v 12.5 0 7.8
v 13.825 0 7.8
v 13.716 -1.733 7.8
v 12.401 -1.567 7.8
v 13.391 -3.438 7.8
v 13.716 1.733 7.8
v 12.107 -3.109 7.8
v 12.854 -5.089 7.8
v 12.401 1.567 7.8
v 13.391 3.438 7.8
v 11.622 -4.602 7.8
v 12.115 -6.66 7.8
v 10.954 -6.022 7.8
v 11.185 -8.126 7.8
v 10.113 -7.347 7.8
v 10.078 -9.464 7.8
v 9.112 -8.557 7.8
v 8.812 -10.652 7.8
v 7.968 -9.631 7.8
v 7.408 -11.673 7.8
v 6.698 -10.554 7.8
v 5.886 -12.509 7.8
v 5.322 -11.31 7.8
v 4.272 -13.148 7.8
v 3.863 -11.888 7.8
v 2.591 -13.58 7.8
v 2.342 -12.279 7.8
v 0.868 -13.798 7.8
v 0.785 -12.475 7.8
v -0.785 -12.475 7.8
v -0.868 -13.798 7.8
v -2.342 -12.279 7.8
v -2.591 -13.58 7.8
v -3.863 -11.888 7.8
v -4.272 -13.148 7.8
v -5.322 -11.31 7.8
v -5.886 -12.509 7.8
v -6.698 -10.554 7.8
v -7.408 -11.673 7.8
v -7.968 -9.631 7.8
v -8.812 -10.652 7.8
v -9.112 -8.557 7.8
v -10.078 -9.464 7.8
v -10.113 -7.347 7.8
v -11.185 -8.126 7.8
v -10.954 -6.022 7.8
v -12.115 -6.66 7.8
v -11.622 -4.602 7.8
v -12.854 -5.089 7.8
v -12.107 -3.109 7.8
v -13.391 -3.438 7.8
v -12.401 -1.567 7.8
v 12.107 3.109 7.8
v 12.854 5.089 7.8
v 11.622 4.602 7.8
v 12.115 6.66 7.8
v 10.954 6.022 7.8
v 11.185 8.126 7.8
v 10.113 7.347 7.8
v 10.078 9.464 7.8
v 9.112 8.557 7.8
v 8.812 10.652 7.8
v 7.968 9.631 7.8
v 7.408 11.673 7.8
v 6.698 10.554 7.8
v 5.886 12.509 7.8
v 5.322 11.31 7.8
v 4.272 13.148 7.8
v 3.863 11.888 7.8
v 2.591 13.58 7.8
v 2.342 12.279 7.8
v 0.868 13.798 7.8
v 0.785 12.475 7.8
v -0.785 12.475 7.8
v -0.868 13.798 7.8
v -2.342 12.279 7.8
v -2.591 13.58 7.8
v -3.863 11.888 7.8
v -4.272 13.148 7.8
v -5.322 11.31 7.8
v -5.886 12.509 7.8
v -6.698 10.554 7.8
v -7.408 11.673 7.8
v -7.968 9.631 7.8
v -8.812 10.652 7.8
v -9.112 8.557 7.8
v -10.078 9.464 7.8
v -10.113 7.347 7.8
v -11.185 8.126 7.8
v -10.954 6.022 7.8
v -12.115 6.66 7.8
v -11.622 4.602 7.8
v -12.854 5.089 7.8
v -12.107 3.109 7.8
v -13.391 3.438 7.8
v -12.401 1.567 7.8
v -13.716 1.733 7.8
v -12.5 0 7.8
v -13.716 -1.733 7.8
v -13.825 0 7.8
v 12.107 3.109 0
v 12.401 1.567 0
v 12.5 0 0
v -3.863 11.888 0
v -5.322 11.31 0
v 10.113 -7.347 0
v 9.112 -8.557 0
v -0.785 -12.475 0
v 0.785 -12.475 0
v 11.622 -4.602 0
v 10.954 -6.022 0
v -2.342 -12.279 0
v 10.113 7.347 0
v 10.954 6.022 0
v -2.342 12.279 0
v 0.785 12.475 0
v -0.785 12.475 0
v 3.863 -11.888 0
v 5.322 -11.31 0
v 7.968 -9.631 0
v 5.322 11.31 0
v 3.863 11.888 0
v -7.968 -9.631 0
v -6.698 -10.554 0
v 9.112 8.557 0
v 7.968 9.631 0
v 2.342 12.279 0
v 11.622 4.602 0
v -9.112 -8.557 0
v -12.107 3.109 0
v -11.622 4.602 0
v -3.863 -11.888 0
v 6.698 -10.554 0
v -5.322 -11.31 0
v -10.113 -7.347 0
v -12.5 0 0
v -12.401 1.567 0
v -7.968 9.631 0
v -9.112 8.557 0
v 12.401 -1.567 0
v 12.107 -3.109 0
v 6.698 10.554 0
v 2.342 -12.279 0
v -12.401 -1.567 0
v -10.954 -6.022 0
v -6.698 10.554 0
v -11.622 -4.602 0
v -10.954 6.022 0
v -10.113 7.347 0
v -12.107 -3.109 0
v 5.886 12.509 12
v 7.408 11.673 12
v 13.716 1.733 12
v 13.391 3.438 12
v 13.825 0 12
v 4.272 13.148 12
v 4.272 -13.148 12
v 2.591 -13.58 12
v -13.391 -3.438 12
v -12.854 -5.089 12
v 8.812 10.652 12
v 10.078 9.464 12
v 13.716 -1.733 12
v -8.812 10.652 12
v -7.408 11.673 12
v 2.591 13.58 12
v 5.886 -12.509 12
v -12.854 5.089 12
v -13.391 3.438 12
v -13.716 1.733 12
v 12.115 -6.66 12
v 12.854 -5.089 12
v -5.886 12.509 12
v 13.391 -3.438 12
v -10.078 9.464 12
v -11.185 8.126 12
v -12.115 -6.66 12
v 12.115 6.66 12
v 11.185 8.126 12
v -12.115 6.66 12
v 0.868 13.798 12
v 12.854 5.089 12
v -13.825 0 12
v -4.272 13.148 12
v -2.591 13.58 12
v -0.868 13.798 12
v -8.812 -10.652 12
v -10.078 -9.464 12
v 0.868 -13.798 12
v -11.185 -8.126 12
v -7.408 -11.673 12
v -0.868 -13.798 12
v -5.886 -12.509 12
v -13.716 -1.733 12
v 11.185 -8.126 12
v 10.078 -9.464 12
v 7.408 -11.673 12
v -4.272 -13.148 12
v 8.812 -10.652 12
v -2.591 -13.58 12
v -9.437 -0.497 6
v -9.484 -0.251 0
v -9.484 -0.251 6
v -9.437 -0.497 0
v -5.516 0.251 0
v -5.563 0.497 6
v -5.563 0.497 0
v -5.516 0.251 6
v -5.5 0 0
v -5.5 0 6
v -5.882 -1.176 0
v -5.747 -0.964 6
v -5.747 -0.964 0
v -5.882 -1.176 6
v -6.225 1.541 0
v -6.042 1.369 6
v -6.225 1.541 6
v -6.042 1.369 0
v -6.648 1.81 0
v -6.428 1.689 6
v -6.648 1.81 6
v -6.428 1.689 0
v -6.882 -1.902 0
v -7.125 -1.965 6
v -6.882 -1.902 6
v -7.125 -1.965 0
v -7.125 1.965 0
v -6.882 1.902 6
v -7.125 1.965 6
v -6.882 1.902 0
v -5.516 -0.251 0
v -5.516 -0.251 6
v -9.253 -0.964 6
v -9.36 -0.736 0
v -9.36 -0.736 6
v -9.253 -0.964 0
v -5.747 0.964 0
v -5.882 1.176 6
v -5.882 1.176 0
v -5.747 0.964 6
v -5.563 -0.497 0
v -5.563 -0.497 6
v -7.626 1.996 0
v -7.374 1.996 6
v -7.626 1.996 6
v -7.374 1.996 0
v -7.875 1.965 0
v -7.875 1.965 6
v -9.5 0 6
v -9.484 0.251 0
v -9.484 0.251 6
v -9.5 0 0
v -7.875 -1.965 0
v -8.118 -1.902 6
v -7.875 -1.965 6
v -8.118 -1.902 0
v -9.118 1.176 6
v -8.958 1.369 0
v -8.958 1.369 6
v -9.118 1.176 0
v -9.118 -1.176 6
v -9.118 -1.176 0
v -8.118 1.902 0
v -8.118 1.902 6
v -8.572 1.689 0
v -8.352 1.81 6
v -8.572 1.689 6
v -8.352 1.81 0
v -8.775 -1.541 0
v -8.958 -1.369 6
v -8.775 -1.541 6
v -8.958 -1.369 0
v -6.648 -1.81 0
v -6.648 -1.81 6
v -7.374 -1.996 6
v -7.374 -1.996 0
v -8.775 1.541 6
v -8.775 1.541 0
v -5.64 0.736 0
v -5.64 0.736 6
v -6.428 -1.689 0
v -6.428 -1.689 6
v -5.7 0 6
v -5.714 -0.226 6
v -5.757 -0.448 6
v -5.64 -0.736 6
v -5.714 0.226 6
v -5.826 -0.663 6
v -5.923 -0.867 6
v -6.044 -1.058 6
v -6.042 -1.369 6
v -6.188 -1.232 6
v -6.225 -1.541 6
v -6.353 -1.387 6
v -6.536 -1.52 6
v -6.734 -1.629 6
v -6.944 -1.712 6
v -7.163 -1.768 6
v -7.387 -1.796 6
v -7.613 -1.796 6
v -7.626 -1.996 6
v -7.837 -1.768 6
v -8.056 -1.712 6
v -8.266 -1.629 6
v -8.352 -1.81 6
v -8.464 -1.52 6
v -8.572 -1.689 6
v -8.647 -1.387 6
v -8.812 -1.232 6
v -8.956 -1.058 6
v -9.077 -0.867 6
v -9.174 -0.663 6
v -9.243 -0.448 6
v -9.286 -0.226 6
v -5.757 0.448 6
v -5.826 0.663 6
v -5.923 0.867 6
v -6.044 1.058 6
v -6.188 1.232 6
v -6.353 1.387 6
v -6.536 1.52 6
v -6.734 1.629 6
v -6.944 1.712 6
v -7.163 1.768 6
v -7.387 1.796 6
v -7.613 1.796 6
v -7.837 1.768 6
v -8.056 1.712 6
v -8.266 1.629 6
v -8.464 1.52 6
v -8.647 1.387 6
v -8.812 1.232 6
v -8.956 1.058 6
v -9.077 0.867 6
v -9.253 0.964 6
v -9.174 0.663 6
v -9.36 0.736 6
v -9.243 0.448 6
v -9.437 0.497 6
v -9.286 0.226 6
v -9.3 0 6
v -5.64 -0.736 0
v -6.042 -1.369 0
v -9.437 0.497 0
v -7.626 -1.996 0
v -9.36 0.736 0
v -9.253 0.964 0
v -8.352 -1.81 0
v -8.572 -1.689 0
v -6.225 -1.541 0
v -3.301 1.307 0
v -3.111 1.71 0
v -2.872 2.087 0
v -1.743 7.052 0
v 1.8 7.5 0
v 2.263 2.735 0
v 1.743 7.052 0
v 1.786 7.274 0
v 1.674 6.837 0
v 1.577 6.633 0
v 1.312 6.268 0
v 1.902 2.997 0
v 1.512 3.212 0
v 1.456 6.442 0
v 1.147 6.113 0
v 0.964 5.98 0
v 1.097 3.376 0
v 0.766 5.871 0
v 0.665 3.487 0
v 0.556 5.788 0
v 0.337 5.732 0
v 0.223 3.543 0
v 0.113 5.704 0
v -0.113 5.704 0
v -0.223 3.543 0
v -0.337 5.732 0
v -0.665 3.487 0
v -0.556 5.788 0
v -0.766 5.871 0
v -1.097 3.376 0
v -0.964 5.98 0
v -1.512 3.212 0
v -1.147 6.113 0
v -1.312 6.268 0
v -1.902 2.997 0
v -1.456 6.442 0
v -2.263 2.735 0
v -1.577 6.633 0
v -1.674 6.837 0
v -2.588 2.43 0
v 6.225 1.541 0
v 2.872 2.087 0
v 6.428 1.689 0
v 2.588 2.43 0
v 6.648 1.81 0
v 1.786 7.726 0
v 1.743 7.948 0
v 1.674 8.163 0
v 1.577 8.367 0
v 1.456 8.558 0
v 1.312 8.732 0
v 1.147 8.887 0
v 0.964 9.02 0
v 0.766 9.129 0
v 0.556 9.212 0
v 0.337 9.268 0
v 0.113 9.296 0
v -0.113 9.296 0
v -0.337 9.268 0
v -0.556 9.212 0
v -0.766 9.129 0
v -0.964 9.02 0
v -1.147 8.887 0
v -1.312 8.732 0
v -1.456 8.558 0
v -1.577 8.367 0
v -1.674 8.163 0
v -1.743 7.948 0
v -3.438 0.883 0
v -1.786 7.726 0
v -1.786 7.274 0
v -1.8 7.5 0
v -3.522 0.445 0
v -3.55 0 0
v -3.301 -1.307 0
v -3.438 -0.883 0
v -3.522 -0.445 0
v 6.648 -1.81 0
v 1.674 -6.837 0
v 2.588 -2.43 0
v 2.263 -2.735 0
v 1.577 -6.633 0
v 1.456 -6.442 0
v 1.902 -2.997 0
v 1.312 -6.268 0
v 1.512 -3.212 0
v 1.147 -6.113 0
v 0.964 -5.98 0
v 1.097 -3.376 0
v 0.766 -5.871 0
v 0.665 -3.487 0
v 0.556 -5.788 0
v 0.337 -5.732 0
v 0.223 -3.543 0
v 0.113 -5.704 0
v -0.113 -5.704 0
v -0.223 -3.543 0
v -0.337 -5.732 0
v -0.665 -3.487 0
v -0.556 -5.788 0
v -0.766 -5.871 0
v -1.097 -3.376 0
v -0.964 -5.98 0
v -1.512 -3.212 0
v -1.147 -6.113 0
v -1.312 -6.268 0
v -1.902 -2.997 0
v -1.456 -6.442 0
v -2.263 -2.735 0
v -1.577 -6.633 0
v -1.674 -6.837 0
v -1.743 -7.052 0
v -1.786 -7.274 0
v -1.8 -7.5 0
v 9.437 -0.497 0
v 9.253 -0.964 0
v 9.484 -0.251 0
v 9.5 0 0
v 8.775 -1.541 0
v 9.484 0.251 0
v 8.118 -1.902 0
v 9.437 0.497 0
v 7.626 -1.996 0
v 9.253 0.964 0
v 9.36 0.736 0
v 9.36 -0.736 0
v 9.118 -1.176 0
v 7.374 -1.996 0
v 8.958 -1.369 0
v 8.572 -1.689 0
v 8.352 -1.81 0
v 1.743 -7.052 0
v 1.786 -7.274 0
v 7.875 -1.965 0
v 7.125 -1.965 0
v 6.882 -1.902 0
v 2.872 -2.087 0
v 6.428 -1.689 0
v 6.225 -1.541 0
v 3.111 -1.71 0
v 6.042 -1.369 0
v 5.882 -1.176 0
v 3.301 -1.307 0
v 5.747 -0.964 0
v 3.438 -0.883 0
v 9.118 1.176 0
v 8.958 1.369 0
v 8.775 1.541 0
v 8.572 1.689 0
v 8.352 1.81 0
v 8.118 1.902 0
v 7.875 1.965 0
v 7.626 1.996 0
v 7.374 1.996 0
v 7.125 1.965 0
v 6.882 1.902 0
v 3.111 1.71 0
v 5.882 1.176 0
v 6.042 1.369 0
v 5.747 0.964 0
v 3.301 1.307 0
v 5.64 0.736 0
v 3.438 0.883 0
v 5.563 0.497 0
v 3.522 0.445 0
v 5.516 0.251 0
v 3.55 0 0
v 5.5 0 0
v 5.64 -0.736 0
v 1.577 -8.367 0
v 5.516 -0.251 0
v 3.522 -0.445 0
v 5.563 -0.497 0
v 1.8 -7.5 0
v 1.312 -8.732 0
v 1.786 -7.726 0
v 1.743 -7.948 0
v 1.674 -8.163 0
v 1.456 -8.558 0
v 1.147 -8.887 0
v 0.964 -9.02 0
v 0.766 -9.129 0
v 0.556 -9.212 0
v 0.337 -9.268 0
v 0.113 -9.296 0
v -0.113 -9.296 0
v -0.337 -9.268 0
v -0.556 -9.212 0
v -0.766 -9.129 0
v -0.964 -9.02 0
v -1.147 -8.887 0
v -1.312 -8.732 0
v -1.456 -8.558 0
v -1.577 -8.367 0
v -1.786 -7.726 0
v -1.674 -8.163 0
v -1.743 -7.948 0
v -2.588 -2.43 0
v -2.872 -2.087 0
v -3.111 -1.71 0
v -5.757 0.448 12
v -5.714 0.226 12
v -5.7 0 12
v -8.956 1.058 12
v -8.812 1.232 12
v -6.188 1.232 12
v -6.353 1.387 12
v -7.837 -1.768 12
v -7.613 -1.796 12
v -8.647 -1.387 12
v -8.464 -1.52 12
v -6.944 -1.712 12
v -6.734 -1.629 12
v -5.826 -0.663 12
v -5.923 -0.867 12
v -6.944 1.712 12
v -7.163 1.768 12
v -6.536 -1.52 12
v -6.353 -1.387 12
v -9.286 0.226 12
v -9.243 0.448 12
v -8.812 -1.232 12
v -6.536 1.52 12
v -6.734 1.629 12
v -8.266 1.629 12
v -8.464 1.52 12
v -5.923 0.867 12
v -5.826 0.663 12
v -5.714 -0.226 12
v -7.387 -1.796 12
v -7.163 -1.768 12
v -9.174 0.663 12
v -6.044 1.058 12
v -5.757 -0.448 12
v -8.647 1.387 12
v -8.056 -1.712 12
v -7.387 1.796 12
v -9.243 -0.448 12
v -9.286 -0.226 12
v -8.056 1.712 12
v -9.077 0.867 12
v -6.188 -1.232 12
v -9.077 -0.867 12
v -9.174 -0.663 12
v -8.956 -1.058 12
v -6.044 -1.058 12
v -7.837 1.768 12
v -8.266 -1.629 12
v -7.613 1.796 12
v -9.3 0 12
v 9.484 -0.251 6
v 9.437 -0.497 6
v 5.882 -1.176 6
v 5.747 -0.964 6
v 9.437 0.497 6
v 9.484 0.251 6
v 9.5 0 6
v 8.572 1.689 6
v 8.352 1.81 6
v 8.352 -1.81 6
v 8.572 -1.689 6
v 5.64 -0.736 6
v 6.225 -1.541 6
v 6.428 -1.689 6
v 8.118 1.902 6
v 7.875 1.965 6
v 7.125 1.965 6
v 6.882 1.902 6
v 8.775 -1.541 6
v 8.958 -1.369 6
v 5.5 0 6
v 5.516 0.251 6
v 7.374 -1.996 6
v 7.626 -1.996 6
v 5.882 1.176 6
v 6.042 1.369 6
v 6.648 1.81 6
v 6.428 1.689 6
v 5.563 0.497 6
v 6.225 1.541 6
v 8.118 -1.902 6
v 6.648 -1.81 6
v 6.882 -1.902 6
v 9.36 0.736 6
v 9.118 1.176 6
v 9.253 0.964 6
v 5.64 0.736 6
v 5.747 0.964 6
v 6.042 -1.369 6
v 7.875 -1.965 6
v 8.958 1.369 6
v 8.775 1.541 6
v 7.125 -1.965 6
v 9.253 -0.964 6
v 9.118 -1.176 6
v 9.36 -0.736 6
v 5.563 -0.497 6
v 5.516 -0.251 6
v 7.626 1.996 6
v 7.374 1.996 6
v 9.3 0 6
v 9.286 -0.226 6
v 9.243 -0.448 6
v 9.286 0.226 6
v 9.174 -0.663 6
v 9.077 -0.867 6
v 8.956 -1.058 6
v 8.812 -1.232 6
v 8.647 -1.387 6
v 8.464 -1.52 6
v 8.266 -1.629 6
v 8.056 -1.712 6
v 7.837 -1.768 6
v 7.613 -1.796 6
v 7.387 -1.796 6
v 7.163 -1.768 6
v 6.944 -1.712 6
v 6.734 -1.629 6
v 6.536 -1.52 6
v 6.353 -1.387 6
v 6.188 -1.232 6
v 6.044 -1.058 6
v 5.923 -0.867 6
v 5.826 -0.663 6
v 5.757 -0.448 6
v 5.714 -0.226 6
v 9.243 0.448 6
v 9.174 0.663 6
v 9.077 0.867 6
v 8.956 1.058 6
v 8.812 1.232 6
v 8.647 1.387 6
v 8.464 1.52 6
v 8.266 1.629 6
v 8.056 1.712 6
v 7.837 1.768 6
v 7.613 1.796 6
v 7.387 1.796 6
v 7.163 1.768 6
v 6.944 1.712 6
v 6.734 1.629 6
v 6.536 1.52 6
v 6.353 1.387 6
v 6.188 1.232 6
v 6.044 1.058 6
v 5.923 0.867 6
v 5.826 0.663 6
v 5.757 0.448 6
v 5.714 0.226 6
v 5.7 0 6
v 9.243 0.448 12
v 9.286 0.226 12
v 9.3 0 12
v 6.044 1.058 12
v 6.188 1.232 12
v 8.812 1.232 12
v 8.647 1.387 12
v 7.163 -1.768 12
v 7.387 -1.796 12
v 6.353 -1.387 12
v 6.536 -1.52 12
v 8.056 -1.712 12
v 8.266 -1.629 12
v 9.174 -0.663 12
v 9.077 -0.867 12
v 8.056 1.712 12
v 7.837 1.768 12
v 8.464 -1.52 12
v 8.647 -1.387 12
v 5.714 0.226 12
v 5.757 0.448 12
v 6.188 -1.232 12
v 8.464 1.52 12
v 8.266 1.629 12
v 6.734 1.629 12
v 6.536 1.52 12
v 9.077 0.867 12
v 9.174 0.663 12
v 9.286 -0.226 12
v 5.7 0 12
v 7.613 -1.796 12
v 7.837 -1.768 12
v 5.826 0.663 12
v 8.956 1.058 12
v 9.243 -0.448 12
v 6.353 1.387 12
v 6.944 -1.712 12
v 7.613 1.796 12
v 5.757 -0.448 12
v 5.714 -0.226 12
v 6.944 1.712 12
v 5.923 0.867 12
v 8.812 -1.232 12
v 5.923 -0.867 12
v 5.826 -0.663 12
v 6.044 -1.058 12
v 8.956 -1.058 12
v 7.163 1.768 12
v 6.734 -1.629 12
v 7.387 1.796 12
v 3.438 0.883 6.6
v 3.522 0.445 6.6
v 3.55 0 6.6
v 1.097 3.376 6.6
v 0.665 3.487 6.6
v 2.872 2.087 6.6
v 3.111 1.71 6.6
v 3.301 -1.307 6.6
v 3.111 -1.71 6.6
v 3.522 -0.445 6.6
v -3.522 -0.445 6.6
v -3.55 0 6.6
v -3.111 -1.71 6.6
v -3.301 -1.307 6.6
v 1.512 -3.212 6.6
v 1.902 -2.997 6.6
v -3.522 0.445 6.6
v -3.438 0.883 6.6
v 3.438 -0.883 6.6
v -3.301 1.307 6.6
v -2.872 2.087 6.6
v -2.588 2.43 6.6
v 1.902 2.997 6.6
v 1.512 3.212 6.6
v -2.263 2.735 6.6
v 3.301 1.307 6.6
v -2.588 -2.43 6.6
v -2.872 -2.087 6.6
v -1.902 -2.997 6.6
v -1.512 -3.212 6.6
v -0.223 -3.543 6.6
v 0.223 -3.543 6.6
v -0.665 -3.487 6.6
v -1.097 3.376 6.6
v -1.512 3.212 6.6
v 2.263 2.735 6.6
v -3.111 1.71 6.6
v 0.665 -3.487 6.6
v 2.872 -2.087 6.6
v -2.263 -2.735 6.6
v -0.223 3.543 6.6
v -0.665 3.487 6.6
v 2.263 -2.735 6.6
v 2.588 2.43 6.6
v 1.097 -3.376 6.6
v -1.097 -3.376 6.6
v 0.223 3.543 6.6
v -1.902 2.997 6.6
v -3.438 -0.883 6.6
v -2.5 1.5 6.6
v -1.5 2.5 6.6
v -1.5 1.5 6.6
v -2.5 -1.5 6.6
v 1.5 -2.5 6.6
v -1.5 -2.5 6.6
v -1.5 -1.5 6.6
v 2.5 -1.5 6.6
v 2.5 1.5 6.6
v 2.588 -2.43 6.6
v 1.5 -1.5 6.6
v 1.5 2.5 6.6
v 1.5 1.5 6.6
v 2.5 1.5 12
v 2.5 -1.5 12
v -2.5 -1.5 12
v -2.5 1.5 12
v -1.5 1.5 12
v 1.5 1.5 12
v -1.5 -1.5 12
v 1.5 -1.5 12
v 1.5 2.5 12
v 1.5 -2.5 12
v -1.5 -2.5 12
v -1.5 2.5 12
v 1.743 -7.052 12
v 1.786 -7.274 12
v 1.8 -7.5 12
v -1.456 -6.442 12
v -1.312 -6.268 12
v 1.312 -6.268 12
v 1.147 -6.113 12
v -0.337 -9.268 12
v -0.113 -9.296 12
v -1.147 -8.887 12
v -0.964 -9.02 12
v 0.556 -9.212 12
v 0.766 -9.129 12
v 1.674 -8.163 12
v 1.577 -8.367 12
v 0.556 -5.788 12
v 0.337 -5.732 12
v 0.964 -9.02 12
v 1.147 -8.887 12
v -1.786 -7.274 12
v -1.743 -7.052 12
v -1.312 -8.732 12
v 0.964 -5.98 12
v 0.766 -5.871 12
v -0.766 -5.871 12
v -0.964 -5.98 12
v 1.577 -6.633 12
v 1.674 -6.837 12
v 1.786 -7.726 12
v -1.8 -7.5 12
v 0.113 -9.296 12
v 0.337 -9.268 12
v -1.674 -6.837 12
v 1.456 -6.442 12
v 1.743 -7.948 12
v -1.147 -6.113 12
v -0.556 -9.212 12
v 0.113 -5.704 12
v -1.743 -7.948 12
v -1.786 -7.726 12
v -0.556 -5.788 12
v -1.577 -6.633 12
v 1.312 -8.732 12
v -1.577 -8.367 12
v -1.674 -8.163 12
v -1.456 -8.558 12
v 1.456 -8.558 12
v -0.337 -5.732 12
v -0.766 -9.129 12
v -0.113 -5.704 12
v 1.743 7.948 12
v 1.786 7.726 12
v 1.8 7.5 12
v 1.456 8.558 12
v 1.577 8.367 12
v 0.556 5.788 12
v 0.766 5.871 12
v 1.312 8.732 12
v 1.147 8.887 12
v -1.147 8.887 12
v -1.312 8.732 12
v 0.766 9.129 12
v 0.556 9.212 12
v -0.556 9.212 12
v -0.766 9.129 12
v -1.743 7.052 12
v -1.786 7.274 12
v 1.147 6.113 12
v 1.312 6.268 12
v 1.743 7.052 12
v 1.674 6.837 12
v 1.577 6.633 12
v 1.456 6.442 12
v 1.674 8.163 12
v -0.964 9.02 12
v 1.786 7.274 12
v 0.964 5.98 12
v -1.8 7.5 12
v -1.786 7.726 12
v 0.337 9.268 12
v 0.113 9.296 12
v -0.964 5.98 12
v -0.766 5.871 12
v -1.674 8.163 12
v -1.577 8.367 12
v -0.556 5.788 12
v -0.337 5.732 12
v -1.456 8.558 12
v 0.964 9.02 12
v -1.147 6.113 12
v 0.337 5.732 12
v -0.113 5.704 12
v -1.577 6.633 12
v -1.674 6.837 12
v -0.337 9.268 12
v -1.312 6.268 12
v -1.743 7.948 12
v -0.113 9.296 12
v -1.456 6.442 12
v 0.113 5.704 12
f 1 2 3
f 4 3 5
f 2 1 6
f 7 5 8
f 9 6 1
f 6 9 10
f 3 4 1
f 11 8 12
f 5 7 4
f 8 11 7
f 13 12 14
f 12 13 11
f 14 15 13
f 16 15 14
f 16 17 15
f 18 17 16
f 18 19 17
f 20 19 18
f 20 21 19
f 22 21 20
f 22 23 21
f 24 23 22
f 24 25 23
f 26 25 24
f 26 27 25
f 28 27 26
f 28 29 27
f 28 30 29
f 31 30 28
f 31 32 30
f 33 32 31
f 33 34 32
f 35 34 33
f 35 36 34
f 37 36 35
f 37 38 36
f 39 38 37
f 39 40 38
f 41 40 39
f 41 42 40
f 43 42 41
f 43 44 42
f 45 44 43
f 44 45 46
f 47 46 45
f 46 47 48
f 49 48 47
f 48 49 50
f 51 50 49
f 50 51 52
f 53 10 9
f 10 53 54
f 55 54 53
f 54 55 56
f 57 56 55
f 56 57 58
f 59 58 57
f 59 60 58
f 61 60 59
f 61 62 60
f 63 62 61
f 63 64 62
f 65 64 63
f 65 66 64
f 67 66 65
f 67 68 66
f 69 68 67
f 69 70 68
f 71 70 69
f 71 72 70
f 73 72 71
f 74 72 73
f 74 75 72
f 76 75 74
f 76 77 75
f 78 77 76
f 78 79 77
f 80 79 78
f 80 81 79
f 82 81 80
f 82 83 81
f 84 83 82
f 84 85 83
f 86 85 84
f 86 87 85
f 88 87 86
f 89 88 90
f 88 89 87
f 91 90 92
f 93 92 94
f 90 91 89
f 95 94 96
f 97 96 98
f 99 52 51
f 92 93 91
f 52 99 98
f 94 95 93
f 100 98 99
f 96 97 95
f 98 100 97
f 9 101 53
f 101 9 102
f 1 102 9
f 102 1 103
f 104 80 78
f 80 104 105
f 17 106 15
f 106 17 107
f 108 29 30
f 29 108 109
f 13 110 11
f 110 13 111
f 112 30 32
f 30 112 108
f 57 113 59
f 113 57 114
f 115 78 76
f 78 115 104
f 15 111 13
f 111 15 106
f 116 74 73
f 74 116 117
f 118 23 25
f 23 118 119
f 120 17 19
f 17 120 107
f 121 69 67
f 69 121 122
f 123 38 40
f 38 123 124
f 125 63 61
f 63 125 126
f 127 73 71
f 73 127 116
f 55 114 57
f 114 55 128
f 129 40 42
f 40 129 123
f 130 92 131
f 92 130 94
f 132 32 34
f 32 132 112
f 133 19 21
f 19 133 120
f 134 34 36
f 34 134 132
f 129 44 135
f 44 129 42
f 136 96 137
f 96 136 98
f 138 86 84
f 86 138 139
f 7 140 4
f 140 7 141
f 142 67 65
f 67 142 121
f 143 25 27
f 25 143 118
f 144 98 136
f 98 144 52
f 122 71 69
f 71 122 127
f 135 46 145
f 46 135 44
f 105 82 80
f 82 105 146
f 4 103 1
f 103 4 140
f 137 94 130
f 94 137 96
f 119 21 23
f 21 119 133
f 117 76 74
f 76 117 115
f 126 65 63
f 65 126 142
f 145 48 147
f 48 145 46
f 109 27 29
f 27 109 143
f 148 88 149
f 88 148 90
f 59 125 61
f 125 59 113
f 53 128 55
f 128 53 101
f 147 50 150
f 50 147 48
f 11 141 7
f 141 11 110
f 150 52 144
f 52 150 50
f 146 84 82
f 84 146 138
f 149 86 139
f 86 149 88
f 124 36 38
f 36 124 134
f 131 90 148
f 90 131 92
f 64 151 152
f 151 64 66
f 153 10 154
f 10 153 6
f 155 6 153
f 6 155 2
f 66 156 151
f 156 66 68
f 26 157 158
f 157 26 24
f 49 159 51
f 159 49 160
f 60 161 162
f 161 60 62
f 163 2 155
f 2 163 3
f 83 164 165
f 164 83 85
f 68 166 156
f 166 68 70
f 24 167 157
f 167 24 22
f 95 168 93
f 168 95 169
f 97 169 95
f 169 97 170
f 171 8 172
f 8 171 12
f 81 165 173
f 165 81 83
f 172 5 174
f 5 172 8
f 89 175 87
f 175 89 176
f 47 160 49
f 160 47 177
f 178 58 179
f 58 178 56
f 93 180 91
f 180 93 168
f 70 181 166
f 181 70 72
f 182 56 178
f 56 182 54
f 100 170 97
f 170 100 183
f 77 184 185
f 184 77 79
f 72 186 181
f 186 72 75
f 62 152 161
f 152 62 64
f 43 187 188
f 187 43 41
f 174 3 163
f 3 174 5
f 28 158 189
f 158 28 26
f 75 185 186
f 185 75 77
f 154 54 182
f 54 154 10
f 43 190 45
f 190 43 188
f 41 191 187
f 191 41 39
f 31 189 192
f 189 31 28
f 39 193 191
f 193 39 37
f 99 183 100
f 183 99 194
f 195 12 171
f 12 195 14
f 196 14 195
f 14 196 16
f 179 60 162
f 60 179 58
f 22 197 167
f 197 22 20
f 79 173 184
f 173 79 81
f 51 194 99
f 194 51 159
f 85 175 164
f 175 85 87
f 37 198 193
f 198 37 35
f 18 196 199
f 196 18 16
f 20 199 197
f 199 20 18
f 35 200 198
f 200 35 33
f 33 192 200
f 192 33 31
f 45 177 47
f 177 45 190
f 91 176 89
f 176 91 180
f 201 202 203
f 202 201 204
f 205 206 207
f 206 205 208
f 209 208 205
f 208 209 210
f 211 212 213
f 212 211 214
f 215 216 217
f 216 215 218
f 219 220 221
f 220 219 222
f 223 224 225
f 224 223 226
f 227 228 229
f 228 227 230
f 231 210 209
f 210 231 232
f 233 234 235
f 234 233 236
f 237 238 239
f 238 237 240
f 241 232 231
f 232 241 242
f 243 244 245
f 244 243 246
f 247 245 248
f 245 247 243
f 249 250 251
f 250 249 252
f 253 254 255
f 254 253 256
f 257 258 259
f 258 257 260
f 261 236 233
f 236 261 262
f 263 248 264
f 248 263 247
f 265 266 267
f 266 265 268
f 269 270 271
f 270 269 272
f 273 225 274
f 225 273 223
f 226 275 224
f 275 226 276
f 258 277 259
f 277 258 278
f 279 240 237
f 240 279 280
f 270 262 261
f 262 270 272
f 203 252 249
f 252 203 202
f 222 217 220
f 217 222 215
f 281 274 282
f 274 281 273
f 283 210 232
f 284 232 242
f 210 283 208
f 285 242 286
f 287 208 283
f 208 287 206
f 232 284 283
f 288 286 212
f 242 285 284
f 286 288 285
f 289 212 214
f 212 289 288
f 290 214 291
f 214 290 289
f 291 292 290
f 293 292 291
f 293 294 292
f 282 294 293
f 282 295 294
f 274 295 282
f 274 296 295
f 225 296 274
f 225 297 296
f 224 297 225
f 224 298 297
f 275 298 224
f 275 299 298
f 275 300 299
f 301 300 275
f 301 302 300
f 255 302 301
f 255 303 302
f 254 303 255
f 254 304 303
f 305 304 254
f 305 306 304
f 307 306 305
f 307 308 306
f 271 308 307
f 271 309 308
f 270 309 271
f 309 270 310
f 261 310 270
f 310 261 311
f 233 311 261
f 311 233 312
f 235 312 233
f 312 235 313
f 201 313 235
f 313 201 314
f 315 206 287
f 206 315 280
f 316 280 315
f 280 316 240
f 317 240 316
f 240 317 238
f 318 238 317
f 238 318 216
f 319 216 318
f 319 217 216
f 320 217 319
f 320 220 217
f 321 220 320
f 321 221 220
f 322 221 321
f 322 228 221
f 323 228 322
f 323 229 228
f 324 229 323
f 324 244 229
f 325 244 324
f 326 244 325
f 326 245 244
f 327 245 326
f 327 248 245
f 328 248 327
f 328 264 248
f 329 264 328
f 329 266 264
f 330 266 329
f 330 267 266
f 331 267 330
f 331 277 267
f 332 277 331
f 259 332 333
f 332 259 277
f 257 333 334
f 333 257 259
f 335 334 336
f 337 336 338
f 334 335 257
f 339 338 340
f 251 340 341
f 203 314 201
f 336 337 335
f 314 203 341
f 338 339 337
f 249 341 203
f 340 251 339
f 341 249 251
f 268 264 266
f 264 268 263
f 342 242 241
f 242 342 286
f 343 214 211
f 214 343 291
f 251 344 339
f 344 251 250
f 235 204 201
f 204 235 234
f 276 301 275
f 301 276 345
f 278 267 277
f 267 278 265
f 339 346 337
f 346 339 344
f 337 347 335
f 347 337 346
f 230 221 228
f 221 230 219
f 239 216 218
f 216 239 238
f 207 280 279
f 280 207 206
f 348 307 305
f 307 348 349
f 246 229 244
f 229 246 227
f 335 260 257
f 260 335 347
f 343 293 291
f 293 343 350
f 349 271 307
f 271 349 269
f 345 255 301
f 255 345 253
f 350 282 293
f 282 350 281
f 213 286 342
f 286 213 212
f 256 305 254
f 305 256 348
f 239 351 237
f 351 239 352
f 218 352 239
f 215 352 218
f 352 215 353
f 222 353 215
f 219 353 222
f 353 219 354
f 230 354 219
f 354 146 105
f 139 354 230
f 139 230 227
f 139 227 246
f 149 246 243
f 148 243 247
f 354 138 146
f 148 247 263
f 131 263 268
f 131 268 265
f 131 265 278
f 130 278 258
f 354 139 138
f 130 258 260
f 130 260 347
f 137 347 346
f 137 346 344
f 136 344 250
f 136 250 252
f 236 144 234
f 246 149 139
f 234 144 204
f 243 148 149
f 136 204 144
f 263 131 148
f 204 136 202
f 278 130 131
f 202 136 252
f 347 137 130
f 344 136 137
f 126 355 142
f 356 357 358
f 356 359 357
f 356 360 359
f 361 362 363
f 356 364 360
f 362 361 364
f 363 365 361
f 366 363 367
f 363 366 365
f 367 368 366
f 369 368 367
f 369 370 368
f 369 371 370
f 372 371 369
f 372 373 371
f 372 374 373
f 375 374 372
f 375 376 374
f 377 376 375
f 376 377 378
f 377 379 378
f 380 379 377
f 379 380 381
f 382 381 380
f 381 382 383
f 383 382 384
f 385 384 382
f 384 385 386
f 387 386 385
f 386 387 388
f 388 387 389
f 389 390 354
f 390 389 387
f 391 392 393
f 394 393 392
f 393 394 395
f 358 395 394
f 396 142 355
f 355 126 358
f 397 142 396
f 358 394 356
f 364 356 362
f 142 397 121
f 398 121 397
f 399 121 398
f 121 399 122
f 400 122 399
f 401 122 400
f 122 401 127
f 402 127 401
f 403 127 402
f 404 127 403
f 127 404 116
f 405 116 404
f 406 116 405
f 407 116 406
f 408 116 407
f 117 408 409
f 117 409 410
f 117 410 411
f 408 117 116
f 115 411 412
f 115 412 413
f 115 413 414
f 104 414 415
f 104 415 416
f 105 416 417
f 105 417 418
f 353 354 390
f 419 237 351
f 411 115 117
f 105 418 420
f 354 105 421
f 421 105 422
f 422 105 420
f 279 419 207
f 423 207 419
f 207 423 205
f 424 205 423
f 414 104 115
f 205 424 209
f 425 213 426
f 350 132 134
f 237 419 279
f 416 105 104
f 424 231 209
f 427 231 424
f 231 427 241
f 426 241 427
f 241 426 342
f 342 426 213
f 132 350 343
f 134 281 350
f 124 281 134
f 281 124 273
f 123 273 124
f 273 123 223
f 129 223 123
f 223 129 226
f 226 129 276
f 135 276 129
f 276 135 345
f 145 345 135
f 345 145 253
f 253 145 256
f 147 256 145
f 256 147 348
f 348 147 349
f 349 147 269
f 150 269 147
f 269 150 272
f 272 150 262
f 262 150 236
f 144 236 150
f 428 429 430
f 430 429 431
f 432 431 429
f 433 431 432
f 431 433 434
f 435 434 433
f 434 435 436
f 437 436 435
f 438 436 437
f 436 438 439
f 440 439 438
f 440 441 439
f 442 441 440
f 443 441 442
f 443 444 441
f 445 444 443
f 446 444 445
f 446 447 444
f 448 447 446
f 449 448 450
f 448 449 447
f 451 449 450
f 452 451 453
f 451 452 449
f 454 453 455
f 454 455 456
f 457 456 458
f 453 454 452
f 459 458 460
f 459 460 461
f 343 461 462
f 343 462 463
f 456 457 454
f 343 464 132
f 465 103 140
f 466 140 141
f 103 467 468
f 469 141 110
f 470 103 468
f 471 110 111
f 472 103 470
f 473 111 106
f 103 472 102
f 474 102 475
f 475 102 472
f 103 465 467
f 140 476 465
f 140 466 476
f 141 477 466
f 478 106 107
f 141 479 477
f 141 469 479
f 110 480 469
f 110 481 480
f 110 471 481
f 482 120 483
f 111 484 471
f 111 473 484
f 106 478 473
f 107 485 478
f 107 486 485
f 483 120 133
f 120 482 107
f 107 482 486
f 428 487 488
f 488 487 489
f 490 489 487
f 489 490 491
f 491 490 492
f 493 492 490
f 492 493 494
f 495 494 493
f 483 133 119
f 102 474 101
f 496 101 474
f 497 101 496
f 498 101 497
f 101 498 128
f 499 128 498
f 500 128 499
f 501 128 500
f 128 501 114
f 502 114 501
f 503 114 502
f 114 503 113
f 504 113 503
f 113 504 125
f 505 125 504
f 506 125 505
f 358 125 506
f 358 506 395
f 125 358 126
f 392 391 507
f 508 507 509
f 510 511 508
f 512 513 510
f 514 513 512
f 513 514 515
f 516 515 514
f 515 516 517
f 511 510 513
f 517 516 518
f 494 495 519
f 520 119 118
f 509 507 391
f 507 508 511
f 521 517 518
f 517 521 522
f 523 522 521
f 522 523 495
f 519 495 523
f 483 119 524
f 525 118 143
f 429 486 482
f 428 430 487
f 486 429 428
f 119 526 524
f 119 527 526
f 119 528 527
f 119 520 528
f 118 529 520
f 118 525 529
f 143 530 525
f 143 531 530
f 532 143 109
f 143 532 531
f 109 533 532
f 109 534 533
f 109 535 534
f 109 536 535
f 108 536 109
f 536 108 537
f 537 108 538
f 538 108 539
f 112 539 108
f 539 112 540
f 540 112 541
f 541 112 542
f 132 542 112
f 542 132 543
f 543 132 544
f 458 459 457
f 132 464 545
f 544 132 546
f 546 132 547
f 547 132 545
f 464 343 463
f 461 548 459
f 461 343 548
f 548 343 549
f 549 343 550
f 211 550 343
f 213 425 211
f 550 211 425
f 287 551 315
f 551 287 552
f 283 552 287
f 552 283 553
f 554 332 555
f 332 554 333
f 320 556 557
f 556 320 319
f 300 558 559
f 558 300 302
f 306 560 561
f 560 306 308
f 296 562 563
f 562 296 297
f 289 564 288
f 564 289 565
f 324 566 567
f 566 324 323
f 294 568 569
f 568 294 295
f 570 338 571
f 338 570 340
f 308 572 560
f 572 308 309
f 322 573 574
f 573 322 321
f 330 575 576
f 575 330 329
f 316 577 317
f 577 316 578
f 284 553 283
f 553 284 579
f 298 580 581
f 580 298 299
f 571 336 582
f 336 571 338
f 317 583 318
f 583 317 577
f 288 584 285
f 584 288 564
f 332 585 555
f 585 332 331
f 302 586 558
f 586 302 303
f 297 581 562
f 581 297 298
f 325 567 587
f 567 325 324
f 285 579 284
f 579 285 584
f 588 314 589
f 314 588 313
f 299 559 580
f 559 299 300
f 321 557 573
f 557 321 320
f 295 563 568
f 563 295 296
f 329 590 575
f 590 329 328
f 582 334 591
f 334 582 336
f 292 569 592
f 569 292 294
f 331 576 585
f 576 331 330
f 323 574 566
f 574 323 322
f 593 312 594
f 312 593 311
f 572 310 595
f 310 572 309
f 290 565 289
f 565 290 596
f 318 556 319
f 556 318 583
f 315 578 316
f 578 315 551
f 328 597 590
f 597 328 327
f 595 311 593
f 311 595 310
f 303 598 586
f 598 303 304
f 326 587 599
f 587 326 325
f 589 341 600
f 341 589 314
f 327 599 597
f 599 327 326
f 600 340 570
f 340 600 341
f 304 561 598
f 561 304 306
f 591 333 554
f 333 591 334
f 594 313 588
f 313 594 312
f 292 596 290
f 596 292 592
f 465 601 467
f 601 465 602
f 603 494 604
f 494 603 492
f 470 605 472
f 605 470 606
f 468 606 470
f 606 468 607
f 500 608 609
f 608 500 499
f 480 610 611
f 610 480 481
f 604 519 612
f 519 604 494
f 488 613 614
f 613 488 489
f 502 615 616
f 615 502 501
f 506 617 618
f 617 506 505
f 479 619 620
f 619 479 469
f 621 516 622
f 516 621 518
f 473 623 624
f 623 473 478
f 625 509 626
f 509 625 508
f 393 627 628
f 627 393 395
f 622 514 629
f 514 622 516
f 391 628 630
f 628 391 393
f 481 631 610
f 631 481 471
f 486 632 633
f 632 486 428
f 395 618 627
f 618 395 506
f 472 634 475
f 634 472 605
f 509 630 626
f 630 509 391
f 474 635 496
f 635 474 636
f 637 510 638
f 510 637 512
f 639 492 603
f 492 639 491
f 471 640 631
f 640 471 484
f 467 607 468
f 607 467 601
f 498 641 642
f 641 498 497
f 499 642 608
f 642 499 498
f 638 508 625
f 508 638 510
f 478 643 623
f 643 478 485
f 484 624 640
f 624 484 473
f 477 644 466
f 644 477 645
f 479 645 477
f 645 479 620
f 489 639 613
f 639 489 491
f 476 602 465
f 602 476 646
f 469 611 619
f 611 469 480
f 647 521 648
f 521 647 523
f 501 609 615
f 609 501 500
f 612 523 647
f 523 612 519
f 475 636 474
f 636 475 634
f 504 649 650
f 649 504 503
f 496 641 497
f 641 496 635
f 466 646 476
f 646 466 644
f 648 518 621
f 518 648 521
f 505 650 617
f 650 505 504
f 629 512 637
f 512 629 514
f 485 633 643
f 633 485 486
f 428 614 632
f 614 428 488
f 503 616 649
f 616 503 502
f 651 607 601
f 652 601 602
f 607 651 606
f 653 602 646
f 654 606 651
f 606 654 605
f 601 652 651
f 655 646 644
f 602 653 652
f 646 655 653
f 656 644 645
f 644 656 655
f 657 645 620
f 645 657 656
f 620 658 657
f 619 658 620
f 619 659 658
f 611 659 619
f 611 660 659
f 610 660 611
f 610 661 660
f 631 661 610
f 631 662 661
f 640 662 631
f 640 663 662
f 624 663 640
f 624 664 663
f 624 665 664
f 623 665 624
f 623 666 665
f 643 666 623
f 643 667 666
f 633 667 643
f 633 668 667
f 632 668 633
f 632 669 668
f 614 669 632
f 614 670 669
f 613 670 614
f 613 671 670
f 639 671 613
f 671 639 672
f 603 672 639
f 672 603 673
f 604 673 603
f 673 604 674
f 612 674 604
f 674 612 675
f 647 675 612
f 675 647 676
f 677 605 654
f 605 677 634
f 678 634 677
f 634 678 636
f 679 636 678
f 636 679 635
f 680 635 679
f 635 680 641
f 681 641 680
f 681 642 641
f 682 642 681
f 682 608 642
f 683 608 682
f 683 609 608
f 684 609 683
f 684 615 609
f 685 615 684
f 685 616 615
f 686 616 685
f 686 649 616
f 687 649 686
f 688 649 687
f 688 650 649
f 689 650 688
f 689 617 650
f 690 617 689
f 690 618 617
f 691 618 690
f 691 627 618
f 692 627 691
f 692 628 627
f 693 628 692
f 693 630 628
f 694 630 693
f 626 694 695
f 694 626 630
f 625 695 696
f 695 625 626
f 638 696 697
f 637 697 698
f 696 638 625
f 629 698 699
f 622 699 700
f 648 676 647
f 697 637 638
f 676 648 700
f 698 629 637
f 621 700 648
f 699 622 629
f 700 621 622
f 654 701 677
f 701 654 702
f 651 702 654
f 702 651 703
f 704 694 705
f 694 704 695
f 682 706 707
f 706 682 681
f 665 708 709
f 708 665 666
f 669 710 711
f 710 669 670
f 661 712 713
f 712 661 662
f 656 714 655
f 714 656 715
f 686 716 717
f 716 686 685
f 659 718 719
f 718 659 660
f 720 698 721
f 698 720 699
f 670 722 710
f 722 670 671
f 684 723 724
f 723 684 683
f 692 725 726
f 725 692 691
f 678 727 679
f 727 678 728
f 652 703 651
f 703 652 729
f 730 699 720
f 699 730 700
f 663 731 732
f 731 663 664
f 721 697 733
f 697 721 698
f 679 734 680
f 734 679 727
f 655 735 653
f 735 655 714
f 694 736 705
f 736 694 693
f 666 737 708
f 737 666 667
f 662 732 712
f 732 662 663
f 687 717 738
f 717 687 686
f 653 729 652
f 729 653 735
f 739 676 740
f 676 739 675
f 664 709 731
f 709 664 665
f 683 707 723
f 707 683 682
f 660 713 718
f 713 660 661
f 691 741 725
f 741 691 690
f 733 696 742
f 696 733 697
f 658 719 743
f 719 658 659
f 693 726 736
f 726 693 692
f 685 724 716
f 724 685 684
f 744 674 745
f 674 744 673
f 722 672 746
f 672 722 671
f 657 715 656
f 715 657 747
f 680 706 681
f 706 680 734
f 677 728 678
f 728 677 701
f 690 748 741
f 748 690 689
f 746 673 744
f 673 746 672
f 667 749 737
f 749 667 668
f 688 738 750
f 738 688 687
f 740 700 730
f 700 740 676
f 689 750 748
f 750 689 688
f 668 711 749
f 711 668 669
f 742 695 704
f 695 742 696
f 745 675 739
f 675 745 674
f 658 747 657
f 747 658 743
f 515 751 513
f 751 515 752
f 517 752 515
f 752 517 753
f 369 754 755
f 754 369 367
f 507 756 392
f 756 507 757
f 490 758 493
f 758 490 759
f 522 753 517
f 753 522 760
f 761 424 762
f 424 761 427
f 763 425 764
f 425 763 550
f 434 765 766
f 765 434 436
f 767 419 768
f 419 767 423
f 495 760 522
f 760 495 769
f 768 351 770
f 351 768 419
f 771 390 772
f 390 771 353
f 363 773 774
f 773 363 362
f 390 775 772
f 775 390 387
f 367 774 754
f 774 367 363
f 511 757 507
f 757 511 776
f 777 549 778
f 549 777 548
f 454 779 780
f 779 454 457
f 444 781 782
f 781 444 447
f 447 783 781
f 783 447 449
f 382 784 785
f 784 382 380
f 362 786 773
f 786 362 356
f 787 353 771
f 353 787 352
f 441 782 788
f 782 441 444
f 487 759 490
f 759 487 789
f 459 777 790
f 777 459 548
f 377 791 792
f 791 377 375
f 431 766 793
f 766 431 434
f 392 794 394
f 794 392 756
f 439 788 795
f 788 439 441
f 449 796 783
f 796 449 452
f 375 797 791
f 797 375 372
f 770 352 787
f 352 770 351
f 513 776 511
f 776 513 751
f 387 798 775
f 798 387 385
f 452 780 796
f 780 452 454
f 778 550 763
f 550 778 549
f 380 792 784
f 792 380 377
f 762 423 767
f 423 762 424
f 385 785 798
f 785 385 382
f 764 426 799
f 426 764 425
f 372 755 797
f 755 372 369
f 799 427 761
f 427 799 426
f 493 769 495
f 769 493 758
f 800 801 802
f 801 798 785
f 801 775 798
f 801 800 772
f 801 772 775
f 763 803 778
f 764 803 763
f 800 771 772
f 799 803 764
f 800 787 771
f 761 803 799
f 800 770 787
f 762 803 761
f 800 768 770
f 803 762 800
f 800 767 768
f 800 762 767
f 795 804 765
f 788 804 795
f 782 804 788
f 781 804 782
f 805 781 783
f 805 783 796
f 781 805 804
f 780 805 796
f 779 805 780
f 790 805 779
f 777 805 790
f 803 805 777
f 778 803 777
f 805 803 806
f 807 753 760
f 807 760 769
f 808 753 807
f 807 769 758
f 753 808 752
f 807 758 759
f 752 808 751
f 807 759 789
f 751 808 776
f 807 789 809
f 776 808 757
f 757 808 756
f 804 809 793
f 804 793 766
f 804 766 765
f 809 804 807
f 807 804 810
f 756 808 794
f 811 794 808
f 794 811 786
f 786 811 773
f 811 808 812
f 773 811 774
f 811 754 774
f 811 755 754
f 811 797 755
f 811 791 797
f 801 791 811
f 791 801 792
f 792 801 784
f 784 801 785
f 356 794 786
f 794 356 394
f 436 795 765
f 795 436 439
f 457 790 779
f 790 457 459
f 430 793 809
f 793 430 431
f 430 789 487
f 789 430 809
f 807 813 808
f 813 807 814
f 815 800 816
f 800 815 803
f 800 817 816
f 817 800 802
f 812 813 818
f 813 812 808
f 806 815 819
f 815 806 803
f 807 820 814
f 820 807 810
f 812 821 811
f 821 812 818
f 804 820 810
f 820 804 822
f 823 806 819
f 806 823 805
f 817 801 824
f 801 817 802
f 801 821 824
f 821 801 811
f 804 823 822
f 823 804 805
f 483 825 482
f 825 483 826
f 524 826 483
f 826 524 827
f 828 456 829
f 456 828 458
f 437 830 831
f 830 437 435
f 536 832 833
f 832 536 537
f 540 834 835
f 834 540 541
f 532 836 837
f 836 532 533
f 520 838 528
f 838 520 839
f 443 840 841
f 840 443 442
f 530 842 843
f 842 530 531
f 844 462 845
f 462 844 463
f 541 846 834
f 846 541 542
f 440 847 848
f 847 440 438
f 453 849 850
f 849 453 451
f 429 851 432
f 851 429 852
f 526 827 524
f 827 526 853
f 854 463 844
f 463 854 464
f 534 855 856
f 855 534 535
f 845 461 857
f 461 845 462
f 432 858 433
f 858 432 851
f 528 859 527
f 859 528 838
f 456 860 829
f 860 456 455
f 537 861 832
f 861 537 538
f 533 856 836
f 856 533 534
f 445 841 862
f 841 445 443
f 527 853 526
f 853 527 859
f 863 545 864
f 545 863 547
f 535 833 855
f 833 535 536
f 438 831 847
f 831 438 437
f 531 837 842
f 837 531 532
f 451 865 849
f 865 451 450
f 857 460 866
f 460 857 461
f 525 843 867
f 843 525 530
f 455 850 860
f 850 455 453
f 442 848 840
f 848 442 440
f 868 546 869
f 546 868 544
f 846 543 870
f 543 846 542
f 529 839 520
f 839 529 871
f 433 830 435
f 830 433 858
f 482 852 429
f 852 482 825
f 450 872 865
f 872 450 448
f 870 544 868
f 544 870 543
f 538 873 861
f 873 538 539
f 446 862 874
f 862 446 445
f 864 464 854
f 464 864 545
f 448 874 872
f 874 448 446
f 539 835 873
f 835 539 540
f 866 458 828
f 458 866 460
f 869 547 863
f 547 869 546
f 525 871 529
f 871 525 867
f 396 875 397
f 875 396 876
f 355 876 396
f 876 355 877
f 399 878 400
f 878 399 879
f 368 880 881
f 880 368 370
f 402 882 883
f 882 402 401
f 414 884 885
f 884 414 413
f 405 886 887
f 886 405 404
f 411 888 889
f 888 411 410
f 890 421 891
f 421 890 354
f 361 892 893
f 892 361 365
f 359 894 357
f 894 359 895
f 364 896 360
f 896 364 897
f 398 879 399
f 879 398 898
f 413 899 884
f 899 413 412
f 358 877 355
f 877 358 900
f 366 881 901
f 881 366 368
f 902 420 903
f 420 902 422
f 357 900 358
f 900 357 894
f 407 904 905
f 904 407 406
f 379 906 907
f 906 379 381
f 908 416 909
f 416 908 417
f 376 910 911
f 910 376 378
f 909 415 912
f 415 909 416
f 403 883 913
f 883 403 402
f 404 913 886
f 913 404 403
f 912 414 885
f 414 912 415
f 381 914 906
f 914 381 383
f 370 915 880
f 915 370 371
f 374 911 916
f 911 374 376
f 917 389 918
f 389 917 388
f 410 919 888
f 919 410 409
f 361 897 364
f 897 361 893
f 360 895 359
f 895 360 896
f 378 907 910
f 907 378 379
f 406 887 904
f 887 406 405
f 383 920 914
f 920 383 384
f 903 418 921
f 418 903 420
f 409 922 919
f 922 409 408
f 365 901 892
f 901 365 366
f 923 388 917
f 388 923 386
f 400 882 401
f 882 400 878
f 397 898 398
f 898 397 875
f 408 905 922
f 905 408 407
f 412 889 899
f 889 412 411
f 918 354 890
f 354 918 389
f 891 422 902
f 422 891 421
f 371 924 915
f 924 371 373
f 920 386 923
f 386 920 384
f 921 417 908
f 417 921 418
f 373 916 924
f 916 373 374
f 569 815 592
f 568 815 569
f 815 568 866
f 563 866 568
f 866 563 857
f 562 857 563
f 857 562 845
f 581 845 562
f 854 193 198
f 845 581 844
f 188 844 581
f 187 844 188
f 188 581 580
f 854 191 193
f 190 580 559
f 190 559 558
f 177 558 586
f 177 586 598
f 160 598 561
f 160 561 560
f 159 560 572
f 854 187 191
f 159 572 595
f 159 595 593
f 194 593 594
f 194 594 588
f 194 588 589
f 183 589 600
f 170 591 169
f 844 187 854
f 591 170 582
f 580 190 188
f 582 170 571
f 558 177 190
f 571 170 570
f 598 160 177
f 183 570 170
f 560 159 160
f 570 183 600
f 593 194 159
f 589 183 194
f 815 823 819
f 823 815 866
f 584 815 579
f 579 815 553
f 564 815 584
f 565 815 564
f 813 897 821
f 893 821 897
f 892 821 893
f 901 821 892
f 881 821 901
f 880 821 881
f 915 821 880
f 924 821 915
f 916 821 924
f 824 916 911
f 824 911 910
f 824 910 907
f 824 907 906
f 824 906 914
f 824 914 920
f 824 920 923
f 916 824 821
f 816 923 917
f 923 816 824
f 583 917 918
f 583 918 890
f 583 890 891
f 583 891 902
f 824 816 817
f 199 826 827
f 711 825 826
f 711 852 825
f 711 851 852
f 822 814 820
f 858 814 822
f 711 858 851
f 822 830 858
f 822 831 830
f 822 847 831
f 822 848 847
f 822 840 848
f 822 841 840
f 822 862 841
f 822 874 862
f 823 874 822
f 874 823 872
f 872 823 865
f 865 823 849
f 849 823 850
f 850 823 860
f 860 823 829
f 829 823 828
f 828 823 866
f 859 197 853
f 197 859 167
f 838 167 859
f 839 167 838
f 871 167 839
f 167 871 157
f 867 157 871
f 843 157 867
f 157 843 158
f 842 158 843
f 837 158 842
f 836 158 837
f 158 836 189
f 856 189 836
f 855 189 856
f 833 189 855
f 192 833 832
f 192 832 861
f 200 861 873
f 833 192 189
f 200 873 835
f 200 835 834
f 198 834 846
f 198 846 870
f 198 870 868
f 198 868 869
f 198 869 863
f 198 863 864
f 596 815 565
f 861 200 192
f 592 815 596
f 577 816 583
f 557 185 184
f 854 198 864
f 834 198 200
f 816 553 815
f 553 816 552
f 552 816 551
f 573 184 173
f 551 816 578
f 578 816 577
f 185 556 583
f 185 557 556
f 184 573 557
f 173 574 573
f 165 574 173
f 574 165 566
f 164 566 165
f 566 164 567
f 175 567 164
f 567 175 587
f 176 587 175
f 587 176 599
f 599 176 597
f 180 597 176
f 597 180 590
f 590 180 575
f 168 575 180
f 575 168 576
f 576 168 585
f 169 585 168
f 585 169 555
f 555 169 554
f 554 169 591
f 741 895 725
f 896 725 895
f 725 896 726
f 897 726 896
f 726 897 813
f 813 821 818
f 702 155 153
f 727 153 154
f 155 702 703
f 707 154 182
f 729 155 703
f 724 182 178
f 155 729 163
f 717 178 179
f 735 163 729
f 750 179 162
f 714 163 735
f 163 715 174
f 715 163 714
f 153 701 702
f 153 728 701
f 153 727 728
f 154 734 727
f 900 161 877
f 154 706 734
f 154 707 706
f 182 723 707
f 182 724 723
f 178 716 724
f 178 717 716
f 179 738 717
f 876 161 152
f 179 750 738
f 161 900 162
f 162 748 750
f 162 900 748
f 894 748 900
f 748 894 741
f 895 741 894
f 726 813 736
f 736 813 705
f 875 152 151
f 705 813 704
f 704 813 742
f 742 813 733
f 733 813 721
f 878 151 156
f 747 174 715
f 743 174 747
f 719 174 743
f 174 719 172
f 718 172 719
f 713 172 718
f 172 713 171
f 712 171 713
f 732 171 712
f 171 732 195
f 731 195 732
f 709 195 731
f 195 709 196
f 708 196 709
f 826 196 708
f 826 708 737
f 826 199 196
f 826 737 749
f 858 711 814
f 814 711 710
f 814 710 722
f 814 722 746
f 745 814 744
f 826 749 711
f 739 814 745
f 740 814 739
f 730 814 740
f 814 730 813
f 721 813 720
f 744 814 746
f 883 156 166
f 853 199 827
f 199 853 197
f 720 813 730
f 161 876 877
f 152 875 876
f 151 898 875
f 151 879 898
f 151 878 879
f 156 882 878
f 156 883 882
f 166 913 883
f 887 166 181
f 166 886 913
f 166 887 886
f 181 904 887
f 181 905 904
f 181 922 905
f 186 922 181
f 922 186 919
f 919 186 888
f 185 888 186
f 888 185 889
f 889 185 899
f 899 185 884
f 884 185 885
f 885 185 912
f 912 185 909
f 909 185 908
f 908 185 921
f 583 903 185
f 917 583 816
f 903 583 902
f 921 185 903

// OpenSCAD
$fn = 50;

difference() {
	union() {
		translate(v = [0, 0, 0]) {
			rotate(a = [0, 0, 0]) {
				difference() {
					union() {
						translate(v = [0, 0, 6.0]) {
							rotate(a = [0, 0, 0]) {
								difference() {
									union() {
										translate(v = [0, 0, -6.0]) {
											cylinder(h = 12, r = 14.5);
										}
									}
									union() {
										translate(v = [0, 0, 0]) {
											rotate(a = [0, 0, 0]) {
												difference() {
													union() {
														translate(v = [0, 0, -1.8]) {
															cylinder(h = 3.6, r = 16.15);
														}
													}
													union() {
														translate(v = [0, 0, -1.81]) {
															cylinder(h = 3.62, r = 12.5);
														}
													}
												}
											}
										}
										translate(v = [0, 0, -3]) {
											rotate(a = [0, 0, 0]) {
												difference() {
													union() {
														translate(v = [0, 0, -1.8]) {
															cylinder(h = 3.6, r = 16.15);
														}
													}
													union() {
														translate(v = [0, 0, -1.81]) {
															cylinder(h = 3.62, r = 12.5);
														}
													}
												}
											}
										}
										translate(v = [0, 0, -6]) {
											rotate(a = [0, 0, 0]) {
												difference() {
													union() {
														translate(v = [0, 0, -1.8]) {
															cylinder(h = 3.6, r = 16.15);
														}
													}
													union() {
														translate(v = [0, 0, -1.81]) {
															cylinder(h = 3.62, r = 12.5);
														}
													}
												}
											}
										}
										translate(v = [0, 0, 0]) {
											rotate(a = [0, 0, 0]) {
												difference() {
													union() {
														translate(v = [0, 0, -21.0]) {
															cylinder(h = 42, r = 14.825);
														}
													}
													union() {
														translate(v = [0, 0, -21.01]) {
															cylinder(h = 42.02, r = 13.825);
														}
													}
												}
											}
										}
										translate(v = [-7.5, 0, -6.0]) {
											cylinder(h = 6, r = 2.0);
										}
										translate(v = [-7.5, 0, -7.0]) {
											cylinder(h = 14, r = 1.8);
										}
										translate(v = [7.5, 0, -6.0]) {
											cylinder(h = 6, r = 2.0);
										}
										translate(v = [7.5, 0, -7.0]) {
											cylinder(h = 14, r = 1.8);
										}
										translate(v = [0, 0, -6.000000000000001]) {
											cylinder(h = 6.6, r = 3.55);
										}
										translate(v = [-2.5, -1.5, -7.0]) {
											cube(size = [5, 3, 14]);
										}
										translate(v = [-1.5, -2.5, -7.0]) {
											cube(size = [3, 5, 14]);
										}
										translate(v = [0.0, -7.5, -7.0]) {
											cylinder(h = 14, r = 1.8);
										}
										translate(v = [0.0, 7.5, -7.0]) {
											cylinder(h = 14, r = 1.8);
										}
									}
								}
							}
						}
					}
					union();
				}
			}
		}
	}
	union();
}
